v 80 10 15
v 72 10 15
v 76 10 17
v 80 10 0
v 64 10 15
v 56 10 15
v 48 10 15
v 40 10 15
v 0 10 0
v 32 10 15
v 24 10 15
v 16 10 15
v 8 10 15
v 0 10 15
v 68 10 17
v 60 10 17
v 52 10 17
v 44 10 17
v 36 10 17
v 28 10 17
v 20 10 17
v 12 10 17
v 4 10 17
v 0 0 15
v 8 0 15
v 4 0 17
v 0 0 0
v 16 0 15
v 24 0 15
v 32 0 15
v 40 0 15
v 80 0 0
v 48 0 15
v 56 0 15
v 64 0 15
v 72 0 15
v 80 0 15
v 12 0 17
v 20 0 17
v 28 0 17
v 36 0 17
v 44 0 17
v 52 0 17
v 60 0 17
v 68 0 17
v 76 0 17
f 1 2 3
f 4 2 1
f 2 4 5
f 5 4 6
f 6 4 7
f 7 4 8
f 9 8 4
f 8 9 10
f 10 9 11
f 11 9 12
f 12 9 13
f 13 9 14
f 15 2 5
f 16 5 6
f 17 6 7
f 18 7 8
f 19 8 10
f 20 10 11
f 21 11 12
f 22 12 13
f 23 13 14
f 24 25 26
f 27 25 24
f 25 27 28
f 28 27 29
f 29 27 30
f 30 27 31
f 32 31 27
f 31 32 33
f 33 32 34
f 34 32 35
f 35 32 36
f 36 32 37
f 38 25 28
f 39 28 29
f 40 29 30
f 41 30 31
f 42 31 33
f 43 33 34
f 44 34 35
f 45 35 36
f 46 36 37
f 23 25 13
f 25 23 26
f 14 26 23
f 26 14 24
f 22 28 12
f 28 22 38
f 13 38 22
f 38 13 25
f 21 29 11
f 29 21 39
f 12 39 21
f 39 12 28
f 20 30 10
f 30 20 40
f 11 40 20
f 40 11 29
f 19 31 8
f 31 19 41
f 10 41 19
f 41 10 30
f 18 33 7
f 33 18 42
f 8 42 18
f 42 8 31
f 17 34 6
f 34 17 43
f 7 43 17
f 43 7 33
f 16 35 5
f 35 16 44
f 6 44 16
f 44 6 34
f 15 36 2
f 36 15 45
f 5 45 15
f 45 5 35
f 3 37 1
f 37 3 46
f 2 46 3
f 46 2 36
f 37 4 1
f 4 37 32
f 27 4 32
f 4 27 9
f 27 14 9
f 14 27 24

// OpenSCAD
// Science Manipulable - Friction

// Parameters

/* [Parameters] */
base_length = 80;
base_width = 10;
base_height = 15;
teeth_height = 2;
num_teeth = 10;


/* [Hidden] */
teeth_width = base_length/num_teeth;

// isosolese triangle module
module iso_triangle(width,height,thickness)
{
    linear_extrude(height = thickness,center = true)
        polygon(points = [[0,0],[width,0],[width/2,height]],path = [0,1,2]);
}

// Main
cube([base_length,base_width,base_height]);
for(i=[0:num_teeth-1])
{
    echo(i);
    translate([i*teeth_width,base_width/2,base_height])
        rotate([90,0,0])
            iso_triangle(teeth_width,teeth_height,base_width);
}
